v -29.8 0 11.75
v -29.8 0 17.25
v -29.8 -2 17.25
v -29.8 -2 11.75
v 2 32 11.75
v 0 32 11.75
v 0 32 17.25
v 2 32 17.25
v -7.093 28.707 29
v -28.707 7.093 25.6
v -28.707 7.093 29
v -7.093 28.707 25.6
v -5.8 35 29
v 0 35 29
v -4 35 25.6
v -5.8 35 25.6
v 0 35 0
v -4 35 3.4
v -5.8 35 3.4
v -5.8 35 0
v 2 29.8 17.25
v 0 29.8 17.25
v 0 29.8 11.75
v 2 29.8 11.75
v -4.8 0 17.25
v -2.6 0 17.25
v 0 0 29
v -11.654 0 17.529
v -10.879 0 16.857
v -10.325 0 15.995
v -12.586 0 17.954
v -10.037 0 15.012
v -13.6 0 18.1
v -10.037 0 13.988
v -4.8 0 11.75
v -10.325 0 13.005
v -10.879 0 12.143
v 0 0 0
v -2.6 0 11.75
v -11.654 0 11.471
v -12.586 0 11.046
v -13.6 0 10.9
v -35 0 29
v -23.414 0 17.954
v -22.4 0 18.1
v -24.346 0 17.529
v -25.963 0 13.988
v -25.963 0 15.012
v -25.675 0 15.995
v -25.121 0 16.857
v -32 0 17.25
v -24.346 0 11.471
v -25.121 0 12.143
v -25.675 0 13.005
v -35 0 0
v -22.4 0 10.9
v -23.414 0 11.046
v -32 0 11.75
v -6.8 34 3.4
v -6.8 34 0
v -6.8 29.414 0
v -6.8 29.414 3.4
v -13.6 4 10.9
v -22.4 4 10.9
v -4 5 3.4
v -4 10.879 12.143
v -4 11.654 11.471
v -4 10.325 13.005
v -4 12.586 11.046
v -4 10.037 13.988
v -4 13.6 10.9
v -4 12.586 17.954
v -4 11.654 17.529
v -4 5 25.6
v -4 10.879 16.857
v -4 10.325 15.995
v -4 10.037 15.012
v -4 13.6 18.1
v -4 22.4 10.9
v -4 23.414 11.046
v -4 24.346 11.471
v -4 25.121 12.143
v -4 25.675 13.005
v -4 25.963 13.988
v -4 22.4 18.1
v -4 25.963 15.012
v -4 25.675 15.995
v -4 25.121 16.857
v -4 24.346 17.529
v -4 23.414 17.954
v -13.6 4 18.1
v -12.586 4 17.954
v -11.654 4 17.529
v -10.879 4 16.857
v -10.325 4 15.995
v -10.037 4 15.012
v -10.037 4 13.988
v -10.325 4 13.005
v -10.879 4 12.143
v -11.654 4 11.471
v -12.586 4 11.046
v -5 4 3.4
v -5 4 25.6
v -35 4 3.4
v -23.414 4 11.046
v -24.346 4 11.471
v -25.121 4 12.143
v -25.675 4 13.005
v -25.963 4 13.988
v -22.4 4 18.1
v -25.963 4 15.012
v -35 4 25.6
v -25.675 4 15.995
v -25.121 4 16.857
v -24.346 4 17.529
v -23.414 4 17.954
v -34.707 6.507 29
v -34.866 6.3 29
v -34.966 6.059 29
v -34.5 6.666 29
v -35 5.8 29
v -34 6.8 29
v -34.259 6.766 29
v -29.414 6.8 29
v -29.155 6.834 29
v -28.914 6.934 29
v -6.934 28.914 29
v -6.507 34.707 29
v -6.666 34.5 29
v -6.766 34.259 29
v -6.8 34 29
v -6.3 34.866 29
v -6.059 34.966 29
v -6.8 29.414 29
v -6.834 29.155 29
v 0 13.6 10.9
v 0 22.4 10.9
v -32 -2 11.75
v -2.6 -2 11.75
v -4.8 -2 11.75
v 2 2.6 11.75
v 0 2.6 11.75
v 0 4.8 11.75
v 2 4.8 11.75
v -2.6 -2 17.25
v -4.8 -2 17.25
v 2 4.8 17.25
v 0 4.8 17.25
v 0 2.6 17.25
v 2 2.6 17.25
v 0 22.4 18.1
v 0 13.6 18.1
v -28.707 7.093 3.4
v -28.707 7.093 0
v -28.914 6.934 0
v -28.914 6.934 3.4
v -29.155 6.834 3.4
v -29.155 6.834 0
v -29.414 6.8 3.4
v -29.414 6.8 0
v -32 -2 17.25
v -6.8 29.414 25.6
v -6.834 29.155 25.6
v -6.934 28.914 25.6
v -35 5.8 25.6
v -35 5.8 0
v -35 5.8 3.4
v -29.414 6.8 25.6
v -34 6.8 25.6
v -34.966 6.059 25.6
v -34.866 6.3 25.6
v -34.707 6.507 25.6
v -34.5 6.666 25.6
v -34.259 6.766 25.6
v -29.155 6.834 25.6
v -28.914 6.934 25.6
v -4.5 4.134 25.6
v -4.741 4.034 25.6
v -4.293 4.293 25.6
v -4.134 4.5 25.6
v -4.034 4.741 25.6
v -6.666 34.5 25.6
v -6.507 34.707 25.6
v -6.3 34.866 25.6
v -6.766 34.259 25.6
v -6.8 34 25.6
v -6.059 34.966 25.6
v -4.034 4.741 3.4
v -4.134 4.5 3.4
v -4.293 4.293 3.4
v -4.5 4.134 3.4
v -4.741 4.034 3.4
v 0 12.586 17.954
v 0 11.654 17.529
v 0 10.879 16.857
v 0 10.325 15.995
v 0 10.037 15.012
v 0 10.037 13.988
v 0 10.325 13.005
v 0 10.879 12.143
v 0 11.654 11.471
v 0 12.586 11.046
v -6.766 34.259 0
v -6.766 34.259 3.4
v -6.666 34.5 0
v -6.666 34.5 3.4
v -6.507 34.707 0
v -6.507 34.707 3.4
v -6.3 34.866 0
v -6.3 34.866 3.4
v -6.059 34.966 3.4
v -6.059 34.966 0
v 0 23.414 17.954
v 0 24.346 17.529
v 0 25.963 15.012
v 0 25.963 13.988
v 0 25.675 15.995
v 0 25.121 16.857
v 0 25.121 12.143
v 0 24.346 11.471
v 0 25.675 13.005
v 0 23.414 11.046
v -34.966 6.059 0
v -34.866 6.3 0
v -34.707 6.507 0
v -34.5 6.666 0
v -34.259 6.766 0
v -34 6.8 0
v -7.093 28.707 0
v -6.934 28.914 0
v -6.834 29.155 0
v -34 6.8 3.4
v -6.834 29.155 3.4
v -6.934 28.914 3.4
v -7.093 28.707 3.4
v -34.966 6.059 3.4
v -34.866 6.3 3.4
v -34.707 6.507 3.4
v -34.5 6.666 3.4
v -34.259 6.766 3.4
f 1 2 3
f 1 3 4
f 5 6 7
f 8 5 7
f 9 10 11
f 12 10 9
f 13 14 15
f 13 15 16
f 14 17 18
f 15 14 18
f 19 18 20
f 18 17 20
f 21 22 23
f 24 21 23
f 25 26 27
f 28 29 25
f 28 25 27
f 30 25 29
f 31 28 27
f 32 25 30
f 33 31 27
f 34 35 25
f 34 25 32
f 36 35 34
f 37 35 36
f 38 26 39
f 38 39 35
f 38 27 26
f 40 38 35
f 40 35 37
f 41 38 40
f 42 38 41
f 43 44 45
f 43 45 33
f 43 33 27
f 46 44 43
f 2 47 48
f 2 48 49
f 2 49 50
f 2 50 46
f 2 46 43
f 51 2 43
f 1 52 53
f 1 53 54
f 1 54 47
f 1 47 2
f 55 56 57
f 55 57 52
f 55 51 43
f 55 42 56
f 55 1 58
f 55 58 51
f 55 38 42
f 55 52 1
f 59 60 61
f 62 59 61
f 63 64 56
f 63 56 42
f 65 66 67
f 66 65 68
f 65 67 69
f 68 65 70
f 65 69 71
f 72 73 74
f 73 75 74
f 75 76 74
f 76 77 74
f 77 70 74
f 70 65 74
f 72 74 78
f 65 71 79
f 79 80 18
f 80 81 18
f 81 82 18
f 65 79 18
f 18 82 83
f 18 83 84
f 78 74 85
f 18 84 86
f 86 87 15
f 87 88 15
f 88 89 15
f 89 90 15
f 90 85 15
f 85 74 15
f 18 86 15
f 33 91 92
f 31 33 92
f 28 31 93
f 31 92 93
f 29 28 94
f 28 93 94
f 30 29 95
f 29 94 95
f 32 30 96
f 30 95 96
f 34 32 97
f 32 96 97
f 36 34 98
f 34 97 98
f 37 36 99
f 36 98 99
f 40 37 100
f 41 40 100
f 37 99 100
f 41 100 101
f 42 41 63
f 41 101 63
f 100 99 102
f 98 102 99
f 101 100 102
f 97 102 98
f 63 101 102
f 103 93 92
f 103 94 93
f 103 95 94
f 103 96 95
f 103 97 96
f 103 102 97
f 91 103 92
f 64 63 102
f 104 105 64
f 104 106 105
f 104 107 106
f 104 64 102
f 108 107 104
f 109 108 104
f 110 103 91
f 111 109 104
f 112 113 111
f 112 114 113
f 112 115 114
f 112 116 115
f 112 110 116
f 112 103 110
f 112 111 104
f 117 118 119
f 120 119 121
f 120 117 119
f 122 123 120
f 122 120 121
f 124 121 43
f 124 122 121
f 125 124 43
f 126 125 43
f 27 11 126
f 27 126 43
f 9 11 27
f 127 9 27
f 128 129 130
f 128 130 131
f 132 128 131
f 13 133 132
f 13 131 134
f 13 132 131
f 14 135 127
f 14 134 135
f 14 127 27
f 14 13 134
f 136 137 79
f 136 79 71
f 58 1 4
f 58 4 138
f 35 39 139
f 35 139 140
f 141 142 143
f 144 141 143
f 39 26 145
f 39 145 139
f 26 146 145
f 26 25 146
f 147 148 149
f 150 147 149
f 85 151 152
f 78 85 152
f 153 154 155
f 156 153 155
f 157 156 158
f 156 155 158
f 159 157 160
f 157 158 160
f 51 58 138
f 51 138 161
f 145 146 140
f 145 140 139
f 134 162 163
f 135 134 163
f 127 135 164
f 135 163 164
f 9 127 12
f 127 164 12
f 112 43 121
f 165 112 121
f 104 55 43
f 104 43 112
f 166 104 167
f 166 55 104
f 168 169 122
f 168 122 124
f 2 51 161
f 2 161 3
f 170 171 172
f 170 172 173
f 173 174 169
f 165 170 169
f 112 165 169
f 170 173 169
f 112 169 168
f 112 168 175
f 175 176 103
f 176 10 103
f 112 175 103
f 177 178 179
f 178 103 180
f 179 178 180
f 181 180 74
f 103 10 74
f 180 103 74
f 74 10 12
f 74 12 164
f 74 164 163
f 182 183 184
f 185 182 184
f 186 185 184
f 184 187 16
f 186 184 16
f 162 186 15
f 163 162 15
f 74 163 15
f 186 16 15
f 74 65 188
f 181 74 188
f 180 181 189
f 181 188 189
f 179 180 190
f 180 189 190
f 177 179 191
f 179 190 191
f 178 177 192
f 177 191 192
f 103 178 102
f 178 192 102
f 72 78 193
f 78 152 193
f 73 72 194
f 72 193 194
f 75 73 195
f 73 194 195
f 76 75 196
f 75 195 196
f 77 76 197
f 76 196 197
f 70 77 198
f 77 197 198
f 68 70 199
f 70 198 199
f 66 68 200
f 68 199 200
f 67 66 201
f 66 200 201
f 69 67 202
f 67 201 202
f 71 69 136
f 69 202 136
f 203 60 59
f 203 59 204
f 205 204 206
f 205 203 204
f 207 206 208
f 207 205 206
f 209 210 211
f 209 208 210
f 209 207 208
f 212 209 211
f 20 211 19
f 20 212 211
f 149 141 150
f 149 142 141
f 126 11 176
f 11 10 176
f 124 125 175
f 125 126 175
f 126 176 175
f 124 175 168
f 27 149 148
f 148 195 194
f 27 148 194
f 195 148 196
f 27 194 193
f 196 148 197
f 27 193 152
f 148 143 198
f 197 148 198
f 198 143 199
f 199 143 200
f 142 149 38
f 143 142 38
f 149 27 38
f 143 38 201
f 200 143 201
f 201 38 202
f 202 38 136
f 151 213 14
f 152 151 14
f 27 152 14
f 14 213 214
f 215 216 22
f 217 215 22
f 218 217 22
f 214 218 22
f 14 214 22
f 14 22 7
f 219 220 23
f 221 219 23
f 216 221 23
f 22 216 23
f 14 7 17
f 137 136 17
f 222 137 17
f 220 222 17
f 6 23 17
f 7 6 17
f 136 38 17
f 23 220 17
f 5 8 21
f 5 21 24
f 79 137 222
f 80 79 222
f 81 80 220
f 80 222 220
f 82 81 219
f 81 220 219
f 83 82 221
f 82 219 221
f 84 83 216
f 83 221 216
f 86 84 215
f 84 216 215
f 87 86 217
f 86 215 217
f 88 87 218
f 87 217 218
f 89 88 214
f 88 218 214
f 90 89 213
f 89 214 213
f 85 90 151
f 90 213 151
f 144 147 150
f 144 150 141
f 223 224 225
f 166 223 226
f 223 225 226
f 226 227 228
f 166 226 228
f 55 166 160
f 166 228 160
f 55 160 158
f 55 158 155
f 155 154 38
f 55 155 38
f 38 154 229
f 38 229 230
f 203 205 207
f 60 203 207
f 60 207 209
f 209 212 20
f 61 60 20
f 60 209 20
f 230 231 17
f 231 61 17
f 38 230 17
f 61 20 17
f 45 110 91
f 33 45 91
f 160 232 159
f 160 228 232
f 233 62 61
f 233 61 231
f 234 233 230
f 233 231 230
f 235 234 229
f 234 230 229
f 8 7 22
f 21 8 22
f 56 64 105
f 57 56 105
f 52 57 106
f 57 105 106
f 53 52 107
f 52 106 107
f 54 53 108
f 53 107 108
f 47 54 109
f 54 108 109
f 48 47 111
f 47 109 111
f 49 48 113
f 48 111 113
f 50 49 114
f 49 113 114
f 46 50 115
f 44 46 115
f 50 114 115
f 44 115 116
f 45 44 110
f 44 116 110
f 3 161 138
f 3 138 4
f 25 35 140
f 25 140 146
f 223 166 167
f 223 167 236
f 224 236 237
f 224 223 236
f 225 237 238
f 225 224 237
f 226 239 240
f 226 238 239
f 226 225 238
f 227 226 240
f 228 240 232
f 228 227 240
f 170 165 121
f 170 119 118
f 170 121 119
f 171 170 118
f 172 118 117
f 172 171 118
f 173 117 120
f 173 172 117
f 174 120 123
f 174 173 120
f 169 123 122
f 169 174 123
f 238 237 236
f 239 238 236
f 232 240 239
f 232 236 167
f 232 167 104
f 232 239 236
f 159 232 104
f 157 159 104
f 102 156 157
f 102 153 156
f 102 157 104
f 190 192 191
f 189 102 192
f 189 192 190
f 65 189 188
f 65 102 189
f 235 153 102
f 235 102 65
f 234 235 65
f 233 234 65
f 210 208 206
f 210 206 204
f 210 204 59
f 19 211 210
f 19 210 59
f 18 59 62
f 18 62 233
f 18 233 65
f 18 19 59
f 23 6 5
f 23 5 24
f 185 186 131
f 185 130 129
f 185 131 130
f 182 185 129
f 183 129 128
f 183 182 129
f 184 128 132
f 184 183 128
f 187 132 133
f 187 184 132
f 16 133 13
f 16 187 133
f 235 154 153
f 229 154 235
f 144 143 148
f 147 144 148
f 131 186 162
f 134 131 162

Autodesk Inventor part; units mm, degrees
ref_plane "YZ Plane" through (0, 0, 0) normal (1, 0, 0) x (0, 1, 0)
ref_plane "XZ Plane" through (0, 0, 0) normal (0, 1, 0) x (-1, 0, 0)
ref_plane "XY Plane" through (0, 0, 0) normal (0, 0, 1) x (1, 0, 0)
sketch "Sketch1" plane through (0, 0, 0) normal (0, 0, 1) x (1, 0, 0)
  line L0 (0, 0) -> (0, 35)
  line L1 (0, 35) -> (-5.8, 35)
  line L2 (-6.8, 34) -> (-6.8, 29.4142)
  line L3 (0, 0) -> (-35, 0)
  line L4 (0, 0) -> (35, 0) construction
  line L5 (-35, 0) -> (-35, 5.8)
  line L6 (-34, 6.8) -> (-29.4142, 6.8)
  line L7 (-28.7071, 7.0929) -> (-7.0929, 28.7071)
  arc A0 (-5.8, 35) -> (-6.8, 34) centre (-5.8, 34) ccw
  arc A1 (-7.0929, 28.7071) -> (-6.8, 29.4142) centre (-7.8, 29.4142) ccw
  arc A2 (-29.4142, 6.8) -> (-28.7071, 7.0929) centre (-29.4142, 7.8) ccw
  arc A3 (-34, 6.8) -> (-35, 5.8) centre (-34, 5.8) ccw
  point P0 (-6.8, 35)
  point P1 (-6.8, 29)
  point P2 (-35, 6.8)
  point P3 (-29, 6.8)
  dimension "d0" = 35
  dimension "d1" = 6.8
  dimension "d2" = 90
  dimension "d3" = 6
  dimension "d4" = 35
  dimension "d5" = 180
  dimension "d6" = 6.8
  dimension "d7" = 6
  dimension "d8" = 90
  dimension "d9" = 1
extrude "Extrusion1" add sketch "Sketch1" along normal blind 29
ref_plane "Work Plane1" through (0, 0, 25.6) normal (0, 0, 1) x (1, 0, 0)
sketch "Sketch2" plane through (0, 0, 25.6) normal (0, 0, 1) x (1, 0, 0)
  line L0 (0, 0) -> (0, 35)
  line L1 (0, 35) -> (-5.8, 35)
  arc A0 (-5.8, 35) -> (-6.8, 34) centre (-5.8, 34) ccw
  line L2 (-6.8, 34) -> (-6.8, 29.4142)
  arc A1 (-7.0929, 28.7071) -> (-6.8, 29.4142) centre (-7.8, 29.4142) ccw
  line L3 (-7.0929, 28.7071) -> (-28.7071, 7.0929)
  arc A2 (-29.4142, 6.8) -> (-28.7071, 7.0929) centre (-29.4142, 7.8) ccw
  line L4 (-29.4142, 6.8) -> (-34, 6.8)
  arc A3 (-34, 6.8) -> (-35, 5.8) centre (-34, 5.8) ccw
  line L5 (-35, 5.8) -> (-35, 0)
  line L6 (-35, 0) -> (0, 0)
  line L7 (0, 0) -> (-4, 0)
  line L8 (-35, 0) -> (0, 0)
  line L9 (-4, 0) -> (-4, 35)
  line L10 (-4, 0) -> (-4, 4)
  line L11 (-4, 4) -> (-35, 4)
  line L12 (-35, 5.8) -> (-35, 0)
  line L13 (-4, 4) -> (-36.3789, 4)
  line L14 (-36.3789, 4) -> (-36.3789, 37.1754)
  line L15 (-36.3789, 37.1754) -> (-4, 37.1754)
  line L16 (-4, 37.1754) -> (-4, 4)
  dimension "d13" = 4
extrude "Extrusion2" cut sketch "Sketch2" against normal blind 22.2 contours L9 L11 L5 A3 L4 A2 L3 A1 L2 A0 L1
sketch "Sketch3" plane through (-35, 4, 25.6) normal (0, 1, 0) x (1, 0, 0)
  line L0 (0, 0) -> (0, 22.2) projected
  line L1 (0, 11.1) -> (9, 11.1)
  line L2 (9, 11.1) -> (12.6, 11.1)
  arc A0 (12.6, 14.7) -> (12.6, 7.5) centre (12.6, 11.1) ccw
  line L3 (17.8, 11.1) -> (25, 11.1)
  line L4 (25, 11.1) -> (21.4, 11.1)
  arc A1 (21.4, 7.5) -> (21.4, 14.7) centre (21.4, 11.1) ccw
  line L5 (12.6, 14.7) -> (21.4, 14.7)
  line L6 (12.6, 7.5) -> (21.4, 7.5)
  point P0 (35, 25.6)
  dimension "d16" = 9
  dimension "d17" = 3.6
  dimension "d18" = 16
  dimension "d19" = 3.6
extrude "Extrusion3" cut sketch "Sketch3" against normal blind 22.2
fillet "Fillet1" radius 1 1 edges at (-4, 4, 14.5)
sketch "Sketch4" plane through (0, 0, 0) normal (0, 0, -1) x (-1, 0, 0)
  line L0 (5, 4) -> (35, 4) projected
  line L1 (4, 35) -> (4, 5) projected
  line L2 (0, 0) -> (0, 2)
  line L3 (0, 0) -> (0, 35) projected
  line L4 (0, 2) -> (0, 0)
  line L5 (0, 2) -> (2, 2)
  dimension "d23" = 2
  dimension "d24" = 2
  dimension "d25" = 2
pattern_circular "Circular Pattern1" count 2 over 270 about axis through (-2, 2, 0) along (0, 0, 1) of "Extrusion3"
sketch "Sketch5" plane through (-35, 0, 0) normal (0, -1, 0) x (1, 0, 0)
  line L0 (0, 25.6) -> (0, 3.4) projected
  line L1 (0, 14.5) -> (3, 14.5)
  line L2 (0, 14.5) -> (3, 14.5) construction
  line L3 (3, 14.5) -> (3, 11.75)
  line L4 (3, 11.75) -> (3, 17.25)
  line L5 (3, 17.25) -> (5.2, 17.25)
  line L6 (5.2, 17.25) -> (5.2, 11.75)
  line L7 (5.2, 11.75) -> (3, 11.75)
  line L8 (35, 0) -> (35, 29) projected
  line L9 (35, 14.5) -> (32.4, 14.5)
  line L10 (32.4, 14.5) -> (32.4, 11.75)
  line L11 (32.4, 11.75) -> (30.2, 11.75)
  line L12 (30.2, 11.75) -> (30.2, 17.25)
  line L13 (30.2, 17.25) -> (32.4, 17.25)
  line L14 (32.4, 17.25) -> (32.4, 11.75)
  dimension "d29" = 3
  dimension "d30" = 0
  dimension "d31" = 2.75
  dimension "d32" = 5.5
  dimension "d33" = 2.2
  dimension "d34" = 2.6
  dimension "d35" = 2.75
  dimension "d36" = 2.2
  dimension "d37" = 5.5
extrude "Extrusion4" add sketch "Sketch5" along normal blind 2
sketch "Sketch7" plane through (-35, -2, 0) normal (0, -1, 0) x (1, 0, 0)
  point P0 (35, 0)
sketch "Sketch9" plane through (0, 0, 0) normal (1, 0, 0) x (0, 0, -1)
  line L0 (-10.9, 22.4) -> (-10.9, 13.6) projected
  arc A0 (-18.1, 13.6) -> (-10.9, 13.6) centre (-14.5, 13.6) ccw projected
  line L1 (-18.1, 13.6) -> (-18.1, 22.4) projected
  arc A1 (-10.9, 22.4) -> (-18.1, 22.4) centre (-14.5, 22.4) ccw projected
  line L2 (0, 0) -> (0, 35) projected
  line L3 (0, 35) -> (-29, 35) projected
  line L4 (-29, 0) -> (-29, 35) projected
  line L5 (0, 0) -> (-29, 0) projected
  line L6 (-11.75, 32) -> (-11.75, 29.8) projected
  line L7 (-11.75, 32) -> (-17.25, 32)
  line L8 (-17.25, 32) -> (-17.25, 29.8)
  line L9 (-17.25, 29.8) -> (-11.75, 29.8)
  line L10 (-11.75, 29.8) -> (-11.75, 32)
  line L11 (-11.75, 2.6) -> (-17.25, 2.6) projected
  line L12 (-11.75, 4.8) -> (-17.25, 4.8)
  line L13 (-17.25, 4.8) -> (-17.25, 2.6)
  line L14 (-17.25, 2.6) -> (-11.75, 2.6)
  line L15 (-11.75, 2.6) -> (-11.75, 4.8)
extrude "Extrusion5" add sketch "Sketch9" along normal blind 2 contours L6 L9 L8 L7 | L11 L13 L12 L15
properties part number "30mm Bracket"
